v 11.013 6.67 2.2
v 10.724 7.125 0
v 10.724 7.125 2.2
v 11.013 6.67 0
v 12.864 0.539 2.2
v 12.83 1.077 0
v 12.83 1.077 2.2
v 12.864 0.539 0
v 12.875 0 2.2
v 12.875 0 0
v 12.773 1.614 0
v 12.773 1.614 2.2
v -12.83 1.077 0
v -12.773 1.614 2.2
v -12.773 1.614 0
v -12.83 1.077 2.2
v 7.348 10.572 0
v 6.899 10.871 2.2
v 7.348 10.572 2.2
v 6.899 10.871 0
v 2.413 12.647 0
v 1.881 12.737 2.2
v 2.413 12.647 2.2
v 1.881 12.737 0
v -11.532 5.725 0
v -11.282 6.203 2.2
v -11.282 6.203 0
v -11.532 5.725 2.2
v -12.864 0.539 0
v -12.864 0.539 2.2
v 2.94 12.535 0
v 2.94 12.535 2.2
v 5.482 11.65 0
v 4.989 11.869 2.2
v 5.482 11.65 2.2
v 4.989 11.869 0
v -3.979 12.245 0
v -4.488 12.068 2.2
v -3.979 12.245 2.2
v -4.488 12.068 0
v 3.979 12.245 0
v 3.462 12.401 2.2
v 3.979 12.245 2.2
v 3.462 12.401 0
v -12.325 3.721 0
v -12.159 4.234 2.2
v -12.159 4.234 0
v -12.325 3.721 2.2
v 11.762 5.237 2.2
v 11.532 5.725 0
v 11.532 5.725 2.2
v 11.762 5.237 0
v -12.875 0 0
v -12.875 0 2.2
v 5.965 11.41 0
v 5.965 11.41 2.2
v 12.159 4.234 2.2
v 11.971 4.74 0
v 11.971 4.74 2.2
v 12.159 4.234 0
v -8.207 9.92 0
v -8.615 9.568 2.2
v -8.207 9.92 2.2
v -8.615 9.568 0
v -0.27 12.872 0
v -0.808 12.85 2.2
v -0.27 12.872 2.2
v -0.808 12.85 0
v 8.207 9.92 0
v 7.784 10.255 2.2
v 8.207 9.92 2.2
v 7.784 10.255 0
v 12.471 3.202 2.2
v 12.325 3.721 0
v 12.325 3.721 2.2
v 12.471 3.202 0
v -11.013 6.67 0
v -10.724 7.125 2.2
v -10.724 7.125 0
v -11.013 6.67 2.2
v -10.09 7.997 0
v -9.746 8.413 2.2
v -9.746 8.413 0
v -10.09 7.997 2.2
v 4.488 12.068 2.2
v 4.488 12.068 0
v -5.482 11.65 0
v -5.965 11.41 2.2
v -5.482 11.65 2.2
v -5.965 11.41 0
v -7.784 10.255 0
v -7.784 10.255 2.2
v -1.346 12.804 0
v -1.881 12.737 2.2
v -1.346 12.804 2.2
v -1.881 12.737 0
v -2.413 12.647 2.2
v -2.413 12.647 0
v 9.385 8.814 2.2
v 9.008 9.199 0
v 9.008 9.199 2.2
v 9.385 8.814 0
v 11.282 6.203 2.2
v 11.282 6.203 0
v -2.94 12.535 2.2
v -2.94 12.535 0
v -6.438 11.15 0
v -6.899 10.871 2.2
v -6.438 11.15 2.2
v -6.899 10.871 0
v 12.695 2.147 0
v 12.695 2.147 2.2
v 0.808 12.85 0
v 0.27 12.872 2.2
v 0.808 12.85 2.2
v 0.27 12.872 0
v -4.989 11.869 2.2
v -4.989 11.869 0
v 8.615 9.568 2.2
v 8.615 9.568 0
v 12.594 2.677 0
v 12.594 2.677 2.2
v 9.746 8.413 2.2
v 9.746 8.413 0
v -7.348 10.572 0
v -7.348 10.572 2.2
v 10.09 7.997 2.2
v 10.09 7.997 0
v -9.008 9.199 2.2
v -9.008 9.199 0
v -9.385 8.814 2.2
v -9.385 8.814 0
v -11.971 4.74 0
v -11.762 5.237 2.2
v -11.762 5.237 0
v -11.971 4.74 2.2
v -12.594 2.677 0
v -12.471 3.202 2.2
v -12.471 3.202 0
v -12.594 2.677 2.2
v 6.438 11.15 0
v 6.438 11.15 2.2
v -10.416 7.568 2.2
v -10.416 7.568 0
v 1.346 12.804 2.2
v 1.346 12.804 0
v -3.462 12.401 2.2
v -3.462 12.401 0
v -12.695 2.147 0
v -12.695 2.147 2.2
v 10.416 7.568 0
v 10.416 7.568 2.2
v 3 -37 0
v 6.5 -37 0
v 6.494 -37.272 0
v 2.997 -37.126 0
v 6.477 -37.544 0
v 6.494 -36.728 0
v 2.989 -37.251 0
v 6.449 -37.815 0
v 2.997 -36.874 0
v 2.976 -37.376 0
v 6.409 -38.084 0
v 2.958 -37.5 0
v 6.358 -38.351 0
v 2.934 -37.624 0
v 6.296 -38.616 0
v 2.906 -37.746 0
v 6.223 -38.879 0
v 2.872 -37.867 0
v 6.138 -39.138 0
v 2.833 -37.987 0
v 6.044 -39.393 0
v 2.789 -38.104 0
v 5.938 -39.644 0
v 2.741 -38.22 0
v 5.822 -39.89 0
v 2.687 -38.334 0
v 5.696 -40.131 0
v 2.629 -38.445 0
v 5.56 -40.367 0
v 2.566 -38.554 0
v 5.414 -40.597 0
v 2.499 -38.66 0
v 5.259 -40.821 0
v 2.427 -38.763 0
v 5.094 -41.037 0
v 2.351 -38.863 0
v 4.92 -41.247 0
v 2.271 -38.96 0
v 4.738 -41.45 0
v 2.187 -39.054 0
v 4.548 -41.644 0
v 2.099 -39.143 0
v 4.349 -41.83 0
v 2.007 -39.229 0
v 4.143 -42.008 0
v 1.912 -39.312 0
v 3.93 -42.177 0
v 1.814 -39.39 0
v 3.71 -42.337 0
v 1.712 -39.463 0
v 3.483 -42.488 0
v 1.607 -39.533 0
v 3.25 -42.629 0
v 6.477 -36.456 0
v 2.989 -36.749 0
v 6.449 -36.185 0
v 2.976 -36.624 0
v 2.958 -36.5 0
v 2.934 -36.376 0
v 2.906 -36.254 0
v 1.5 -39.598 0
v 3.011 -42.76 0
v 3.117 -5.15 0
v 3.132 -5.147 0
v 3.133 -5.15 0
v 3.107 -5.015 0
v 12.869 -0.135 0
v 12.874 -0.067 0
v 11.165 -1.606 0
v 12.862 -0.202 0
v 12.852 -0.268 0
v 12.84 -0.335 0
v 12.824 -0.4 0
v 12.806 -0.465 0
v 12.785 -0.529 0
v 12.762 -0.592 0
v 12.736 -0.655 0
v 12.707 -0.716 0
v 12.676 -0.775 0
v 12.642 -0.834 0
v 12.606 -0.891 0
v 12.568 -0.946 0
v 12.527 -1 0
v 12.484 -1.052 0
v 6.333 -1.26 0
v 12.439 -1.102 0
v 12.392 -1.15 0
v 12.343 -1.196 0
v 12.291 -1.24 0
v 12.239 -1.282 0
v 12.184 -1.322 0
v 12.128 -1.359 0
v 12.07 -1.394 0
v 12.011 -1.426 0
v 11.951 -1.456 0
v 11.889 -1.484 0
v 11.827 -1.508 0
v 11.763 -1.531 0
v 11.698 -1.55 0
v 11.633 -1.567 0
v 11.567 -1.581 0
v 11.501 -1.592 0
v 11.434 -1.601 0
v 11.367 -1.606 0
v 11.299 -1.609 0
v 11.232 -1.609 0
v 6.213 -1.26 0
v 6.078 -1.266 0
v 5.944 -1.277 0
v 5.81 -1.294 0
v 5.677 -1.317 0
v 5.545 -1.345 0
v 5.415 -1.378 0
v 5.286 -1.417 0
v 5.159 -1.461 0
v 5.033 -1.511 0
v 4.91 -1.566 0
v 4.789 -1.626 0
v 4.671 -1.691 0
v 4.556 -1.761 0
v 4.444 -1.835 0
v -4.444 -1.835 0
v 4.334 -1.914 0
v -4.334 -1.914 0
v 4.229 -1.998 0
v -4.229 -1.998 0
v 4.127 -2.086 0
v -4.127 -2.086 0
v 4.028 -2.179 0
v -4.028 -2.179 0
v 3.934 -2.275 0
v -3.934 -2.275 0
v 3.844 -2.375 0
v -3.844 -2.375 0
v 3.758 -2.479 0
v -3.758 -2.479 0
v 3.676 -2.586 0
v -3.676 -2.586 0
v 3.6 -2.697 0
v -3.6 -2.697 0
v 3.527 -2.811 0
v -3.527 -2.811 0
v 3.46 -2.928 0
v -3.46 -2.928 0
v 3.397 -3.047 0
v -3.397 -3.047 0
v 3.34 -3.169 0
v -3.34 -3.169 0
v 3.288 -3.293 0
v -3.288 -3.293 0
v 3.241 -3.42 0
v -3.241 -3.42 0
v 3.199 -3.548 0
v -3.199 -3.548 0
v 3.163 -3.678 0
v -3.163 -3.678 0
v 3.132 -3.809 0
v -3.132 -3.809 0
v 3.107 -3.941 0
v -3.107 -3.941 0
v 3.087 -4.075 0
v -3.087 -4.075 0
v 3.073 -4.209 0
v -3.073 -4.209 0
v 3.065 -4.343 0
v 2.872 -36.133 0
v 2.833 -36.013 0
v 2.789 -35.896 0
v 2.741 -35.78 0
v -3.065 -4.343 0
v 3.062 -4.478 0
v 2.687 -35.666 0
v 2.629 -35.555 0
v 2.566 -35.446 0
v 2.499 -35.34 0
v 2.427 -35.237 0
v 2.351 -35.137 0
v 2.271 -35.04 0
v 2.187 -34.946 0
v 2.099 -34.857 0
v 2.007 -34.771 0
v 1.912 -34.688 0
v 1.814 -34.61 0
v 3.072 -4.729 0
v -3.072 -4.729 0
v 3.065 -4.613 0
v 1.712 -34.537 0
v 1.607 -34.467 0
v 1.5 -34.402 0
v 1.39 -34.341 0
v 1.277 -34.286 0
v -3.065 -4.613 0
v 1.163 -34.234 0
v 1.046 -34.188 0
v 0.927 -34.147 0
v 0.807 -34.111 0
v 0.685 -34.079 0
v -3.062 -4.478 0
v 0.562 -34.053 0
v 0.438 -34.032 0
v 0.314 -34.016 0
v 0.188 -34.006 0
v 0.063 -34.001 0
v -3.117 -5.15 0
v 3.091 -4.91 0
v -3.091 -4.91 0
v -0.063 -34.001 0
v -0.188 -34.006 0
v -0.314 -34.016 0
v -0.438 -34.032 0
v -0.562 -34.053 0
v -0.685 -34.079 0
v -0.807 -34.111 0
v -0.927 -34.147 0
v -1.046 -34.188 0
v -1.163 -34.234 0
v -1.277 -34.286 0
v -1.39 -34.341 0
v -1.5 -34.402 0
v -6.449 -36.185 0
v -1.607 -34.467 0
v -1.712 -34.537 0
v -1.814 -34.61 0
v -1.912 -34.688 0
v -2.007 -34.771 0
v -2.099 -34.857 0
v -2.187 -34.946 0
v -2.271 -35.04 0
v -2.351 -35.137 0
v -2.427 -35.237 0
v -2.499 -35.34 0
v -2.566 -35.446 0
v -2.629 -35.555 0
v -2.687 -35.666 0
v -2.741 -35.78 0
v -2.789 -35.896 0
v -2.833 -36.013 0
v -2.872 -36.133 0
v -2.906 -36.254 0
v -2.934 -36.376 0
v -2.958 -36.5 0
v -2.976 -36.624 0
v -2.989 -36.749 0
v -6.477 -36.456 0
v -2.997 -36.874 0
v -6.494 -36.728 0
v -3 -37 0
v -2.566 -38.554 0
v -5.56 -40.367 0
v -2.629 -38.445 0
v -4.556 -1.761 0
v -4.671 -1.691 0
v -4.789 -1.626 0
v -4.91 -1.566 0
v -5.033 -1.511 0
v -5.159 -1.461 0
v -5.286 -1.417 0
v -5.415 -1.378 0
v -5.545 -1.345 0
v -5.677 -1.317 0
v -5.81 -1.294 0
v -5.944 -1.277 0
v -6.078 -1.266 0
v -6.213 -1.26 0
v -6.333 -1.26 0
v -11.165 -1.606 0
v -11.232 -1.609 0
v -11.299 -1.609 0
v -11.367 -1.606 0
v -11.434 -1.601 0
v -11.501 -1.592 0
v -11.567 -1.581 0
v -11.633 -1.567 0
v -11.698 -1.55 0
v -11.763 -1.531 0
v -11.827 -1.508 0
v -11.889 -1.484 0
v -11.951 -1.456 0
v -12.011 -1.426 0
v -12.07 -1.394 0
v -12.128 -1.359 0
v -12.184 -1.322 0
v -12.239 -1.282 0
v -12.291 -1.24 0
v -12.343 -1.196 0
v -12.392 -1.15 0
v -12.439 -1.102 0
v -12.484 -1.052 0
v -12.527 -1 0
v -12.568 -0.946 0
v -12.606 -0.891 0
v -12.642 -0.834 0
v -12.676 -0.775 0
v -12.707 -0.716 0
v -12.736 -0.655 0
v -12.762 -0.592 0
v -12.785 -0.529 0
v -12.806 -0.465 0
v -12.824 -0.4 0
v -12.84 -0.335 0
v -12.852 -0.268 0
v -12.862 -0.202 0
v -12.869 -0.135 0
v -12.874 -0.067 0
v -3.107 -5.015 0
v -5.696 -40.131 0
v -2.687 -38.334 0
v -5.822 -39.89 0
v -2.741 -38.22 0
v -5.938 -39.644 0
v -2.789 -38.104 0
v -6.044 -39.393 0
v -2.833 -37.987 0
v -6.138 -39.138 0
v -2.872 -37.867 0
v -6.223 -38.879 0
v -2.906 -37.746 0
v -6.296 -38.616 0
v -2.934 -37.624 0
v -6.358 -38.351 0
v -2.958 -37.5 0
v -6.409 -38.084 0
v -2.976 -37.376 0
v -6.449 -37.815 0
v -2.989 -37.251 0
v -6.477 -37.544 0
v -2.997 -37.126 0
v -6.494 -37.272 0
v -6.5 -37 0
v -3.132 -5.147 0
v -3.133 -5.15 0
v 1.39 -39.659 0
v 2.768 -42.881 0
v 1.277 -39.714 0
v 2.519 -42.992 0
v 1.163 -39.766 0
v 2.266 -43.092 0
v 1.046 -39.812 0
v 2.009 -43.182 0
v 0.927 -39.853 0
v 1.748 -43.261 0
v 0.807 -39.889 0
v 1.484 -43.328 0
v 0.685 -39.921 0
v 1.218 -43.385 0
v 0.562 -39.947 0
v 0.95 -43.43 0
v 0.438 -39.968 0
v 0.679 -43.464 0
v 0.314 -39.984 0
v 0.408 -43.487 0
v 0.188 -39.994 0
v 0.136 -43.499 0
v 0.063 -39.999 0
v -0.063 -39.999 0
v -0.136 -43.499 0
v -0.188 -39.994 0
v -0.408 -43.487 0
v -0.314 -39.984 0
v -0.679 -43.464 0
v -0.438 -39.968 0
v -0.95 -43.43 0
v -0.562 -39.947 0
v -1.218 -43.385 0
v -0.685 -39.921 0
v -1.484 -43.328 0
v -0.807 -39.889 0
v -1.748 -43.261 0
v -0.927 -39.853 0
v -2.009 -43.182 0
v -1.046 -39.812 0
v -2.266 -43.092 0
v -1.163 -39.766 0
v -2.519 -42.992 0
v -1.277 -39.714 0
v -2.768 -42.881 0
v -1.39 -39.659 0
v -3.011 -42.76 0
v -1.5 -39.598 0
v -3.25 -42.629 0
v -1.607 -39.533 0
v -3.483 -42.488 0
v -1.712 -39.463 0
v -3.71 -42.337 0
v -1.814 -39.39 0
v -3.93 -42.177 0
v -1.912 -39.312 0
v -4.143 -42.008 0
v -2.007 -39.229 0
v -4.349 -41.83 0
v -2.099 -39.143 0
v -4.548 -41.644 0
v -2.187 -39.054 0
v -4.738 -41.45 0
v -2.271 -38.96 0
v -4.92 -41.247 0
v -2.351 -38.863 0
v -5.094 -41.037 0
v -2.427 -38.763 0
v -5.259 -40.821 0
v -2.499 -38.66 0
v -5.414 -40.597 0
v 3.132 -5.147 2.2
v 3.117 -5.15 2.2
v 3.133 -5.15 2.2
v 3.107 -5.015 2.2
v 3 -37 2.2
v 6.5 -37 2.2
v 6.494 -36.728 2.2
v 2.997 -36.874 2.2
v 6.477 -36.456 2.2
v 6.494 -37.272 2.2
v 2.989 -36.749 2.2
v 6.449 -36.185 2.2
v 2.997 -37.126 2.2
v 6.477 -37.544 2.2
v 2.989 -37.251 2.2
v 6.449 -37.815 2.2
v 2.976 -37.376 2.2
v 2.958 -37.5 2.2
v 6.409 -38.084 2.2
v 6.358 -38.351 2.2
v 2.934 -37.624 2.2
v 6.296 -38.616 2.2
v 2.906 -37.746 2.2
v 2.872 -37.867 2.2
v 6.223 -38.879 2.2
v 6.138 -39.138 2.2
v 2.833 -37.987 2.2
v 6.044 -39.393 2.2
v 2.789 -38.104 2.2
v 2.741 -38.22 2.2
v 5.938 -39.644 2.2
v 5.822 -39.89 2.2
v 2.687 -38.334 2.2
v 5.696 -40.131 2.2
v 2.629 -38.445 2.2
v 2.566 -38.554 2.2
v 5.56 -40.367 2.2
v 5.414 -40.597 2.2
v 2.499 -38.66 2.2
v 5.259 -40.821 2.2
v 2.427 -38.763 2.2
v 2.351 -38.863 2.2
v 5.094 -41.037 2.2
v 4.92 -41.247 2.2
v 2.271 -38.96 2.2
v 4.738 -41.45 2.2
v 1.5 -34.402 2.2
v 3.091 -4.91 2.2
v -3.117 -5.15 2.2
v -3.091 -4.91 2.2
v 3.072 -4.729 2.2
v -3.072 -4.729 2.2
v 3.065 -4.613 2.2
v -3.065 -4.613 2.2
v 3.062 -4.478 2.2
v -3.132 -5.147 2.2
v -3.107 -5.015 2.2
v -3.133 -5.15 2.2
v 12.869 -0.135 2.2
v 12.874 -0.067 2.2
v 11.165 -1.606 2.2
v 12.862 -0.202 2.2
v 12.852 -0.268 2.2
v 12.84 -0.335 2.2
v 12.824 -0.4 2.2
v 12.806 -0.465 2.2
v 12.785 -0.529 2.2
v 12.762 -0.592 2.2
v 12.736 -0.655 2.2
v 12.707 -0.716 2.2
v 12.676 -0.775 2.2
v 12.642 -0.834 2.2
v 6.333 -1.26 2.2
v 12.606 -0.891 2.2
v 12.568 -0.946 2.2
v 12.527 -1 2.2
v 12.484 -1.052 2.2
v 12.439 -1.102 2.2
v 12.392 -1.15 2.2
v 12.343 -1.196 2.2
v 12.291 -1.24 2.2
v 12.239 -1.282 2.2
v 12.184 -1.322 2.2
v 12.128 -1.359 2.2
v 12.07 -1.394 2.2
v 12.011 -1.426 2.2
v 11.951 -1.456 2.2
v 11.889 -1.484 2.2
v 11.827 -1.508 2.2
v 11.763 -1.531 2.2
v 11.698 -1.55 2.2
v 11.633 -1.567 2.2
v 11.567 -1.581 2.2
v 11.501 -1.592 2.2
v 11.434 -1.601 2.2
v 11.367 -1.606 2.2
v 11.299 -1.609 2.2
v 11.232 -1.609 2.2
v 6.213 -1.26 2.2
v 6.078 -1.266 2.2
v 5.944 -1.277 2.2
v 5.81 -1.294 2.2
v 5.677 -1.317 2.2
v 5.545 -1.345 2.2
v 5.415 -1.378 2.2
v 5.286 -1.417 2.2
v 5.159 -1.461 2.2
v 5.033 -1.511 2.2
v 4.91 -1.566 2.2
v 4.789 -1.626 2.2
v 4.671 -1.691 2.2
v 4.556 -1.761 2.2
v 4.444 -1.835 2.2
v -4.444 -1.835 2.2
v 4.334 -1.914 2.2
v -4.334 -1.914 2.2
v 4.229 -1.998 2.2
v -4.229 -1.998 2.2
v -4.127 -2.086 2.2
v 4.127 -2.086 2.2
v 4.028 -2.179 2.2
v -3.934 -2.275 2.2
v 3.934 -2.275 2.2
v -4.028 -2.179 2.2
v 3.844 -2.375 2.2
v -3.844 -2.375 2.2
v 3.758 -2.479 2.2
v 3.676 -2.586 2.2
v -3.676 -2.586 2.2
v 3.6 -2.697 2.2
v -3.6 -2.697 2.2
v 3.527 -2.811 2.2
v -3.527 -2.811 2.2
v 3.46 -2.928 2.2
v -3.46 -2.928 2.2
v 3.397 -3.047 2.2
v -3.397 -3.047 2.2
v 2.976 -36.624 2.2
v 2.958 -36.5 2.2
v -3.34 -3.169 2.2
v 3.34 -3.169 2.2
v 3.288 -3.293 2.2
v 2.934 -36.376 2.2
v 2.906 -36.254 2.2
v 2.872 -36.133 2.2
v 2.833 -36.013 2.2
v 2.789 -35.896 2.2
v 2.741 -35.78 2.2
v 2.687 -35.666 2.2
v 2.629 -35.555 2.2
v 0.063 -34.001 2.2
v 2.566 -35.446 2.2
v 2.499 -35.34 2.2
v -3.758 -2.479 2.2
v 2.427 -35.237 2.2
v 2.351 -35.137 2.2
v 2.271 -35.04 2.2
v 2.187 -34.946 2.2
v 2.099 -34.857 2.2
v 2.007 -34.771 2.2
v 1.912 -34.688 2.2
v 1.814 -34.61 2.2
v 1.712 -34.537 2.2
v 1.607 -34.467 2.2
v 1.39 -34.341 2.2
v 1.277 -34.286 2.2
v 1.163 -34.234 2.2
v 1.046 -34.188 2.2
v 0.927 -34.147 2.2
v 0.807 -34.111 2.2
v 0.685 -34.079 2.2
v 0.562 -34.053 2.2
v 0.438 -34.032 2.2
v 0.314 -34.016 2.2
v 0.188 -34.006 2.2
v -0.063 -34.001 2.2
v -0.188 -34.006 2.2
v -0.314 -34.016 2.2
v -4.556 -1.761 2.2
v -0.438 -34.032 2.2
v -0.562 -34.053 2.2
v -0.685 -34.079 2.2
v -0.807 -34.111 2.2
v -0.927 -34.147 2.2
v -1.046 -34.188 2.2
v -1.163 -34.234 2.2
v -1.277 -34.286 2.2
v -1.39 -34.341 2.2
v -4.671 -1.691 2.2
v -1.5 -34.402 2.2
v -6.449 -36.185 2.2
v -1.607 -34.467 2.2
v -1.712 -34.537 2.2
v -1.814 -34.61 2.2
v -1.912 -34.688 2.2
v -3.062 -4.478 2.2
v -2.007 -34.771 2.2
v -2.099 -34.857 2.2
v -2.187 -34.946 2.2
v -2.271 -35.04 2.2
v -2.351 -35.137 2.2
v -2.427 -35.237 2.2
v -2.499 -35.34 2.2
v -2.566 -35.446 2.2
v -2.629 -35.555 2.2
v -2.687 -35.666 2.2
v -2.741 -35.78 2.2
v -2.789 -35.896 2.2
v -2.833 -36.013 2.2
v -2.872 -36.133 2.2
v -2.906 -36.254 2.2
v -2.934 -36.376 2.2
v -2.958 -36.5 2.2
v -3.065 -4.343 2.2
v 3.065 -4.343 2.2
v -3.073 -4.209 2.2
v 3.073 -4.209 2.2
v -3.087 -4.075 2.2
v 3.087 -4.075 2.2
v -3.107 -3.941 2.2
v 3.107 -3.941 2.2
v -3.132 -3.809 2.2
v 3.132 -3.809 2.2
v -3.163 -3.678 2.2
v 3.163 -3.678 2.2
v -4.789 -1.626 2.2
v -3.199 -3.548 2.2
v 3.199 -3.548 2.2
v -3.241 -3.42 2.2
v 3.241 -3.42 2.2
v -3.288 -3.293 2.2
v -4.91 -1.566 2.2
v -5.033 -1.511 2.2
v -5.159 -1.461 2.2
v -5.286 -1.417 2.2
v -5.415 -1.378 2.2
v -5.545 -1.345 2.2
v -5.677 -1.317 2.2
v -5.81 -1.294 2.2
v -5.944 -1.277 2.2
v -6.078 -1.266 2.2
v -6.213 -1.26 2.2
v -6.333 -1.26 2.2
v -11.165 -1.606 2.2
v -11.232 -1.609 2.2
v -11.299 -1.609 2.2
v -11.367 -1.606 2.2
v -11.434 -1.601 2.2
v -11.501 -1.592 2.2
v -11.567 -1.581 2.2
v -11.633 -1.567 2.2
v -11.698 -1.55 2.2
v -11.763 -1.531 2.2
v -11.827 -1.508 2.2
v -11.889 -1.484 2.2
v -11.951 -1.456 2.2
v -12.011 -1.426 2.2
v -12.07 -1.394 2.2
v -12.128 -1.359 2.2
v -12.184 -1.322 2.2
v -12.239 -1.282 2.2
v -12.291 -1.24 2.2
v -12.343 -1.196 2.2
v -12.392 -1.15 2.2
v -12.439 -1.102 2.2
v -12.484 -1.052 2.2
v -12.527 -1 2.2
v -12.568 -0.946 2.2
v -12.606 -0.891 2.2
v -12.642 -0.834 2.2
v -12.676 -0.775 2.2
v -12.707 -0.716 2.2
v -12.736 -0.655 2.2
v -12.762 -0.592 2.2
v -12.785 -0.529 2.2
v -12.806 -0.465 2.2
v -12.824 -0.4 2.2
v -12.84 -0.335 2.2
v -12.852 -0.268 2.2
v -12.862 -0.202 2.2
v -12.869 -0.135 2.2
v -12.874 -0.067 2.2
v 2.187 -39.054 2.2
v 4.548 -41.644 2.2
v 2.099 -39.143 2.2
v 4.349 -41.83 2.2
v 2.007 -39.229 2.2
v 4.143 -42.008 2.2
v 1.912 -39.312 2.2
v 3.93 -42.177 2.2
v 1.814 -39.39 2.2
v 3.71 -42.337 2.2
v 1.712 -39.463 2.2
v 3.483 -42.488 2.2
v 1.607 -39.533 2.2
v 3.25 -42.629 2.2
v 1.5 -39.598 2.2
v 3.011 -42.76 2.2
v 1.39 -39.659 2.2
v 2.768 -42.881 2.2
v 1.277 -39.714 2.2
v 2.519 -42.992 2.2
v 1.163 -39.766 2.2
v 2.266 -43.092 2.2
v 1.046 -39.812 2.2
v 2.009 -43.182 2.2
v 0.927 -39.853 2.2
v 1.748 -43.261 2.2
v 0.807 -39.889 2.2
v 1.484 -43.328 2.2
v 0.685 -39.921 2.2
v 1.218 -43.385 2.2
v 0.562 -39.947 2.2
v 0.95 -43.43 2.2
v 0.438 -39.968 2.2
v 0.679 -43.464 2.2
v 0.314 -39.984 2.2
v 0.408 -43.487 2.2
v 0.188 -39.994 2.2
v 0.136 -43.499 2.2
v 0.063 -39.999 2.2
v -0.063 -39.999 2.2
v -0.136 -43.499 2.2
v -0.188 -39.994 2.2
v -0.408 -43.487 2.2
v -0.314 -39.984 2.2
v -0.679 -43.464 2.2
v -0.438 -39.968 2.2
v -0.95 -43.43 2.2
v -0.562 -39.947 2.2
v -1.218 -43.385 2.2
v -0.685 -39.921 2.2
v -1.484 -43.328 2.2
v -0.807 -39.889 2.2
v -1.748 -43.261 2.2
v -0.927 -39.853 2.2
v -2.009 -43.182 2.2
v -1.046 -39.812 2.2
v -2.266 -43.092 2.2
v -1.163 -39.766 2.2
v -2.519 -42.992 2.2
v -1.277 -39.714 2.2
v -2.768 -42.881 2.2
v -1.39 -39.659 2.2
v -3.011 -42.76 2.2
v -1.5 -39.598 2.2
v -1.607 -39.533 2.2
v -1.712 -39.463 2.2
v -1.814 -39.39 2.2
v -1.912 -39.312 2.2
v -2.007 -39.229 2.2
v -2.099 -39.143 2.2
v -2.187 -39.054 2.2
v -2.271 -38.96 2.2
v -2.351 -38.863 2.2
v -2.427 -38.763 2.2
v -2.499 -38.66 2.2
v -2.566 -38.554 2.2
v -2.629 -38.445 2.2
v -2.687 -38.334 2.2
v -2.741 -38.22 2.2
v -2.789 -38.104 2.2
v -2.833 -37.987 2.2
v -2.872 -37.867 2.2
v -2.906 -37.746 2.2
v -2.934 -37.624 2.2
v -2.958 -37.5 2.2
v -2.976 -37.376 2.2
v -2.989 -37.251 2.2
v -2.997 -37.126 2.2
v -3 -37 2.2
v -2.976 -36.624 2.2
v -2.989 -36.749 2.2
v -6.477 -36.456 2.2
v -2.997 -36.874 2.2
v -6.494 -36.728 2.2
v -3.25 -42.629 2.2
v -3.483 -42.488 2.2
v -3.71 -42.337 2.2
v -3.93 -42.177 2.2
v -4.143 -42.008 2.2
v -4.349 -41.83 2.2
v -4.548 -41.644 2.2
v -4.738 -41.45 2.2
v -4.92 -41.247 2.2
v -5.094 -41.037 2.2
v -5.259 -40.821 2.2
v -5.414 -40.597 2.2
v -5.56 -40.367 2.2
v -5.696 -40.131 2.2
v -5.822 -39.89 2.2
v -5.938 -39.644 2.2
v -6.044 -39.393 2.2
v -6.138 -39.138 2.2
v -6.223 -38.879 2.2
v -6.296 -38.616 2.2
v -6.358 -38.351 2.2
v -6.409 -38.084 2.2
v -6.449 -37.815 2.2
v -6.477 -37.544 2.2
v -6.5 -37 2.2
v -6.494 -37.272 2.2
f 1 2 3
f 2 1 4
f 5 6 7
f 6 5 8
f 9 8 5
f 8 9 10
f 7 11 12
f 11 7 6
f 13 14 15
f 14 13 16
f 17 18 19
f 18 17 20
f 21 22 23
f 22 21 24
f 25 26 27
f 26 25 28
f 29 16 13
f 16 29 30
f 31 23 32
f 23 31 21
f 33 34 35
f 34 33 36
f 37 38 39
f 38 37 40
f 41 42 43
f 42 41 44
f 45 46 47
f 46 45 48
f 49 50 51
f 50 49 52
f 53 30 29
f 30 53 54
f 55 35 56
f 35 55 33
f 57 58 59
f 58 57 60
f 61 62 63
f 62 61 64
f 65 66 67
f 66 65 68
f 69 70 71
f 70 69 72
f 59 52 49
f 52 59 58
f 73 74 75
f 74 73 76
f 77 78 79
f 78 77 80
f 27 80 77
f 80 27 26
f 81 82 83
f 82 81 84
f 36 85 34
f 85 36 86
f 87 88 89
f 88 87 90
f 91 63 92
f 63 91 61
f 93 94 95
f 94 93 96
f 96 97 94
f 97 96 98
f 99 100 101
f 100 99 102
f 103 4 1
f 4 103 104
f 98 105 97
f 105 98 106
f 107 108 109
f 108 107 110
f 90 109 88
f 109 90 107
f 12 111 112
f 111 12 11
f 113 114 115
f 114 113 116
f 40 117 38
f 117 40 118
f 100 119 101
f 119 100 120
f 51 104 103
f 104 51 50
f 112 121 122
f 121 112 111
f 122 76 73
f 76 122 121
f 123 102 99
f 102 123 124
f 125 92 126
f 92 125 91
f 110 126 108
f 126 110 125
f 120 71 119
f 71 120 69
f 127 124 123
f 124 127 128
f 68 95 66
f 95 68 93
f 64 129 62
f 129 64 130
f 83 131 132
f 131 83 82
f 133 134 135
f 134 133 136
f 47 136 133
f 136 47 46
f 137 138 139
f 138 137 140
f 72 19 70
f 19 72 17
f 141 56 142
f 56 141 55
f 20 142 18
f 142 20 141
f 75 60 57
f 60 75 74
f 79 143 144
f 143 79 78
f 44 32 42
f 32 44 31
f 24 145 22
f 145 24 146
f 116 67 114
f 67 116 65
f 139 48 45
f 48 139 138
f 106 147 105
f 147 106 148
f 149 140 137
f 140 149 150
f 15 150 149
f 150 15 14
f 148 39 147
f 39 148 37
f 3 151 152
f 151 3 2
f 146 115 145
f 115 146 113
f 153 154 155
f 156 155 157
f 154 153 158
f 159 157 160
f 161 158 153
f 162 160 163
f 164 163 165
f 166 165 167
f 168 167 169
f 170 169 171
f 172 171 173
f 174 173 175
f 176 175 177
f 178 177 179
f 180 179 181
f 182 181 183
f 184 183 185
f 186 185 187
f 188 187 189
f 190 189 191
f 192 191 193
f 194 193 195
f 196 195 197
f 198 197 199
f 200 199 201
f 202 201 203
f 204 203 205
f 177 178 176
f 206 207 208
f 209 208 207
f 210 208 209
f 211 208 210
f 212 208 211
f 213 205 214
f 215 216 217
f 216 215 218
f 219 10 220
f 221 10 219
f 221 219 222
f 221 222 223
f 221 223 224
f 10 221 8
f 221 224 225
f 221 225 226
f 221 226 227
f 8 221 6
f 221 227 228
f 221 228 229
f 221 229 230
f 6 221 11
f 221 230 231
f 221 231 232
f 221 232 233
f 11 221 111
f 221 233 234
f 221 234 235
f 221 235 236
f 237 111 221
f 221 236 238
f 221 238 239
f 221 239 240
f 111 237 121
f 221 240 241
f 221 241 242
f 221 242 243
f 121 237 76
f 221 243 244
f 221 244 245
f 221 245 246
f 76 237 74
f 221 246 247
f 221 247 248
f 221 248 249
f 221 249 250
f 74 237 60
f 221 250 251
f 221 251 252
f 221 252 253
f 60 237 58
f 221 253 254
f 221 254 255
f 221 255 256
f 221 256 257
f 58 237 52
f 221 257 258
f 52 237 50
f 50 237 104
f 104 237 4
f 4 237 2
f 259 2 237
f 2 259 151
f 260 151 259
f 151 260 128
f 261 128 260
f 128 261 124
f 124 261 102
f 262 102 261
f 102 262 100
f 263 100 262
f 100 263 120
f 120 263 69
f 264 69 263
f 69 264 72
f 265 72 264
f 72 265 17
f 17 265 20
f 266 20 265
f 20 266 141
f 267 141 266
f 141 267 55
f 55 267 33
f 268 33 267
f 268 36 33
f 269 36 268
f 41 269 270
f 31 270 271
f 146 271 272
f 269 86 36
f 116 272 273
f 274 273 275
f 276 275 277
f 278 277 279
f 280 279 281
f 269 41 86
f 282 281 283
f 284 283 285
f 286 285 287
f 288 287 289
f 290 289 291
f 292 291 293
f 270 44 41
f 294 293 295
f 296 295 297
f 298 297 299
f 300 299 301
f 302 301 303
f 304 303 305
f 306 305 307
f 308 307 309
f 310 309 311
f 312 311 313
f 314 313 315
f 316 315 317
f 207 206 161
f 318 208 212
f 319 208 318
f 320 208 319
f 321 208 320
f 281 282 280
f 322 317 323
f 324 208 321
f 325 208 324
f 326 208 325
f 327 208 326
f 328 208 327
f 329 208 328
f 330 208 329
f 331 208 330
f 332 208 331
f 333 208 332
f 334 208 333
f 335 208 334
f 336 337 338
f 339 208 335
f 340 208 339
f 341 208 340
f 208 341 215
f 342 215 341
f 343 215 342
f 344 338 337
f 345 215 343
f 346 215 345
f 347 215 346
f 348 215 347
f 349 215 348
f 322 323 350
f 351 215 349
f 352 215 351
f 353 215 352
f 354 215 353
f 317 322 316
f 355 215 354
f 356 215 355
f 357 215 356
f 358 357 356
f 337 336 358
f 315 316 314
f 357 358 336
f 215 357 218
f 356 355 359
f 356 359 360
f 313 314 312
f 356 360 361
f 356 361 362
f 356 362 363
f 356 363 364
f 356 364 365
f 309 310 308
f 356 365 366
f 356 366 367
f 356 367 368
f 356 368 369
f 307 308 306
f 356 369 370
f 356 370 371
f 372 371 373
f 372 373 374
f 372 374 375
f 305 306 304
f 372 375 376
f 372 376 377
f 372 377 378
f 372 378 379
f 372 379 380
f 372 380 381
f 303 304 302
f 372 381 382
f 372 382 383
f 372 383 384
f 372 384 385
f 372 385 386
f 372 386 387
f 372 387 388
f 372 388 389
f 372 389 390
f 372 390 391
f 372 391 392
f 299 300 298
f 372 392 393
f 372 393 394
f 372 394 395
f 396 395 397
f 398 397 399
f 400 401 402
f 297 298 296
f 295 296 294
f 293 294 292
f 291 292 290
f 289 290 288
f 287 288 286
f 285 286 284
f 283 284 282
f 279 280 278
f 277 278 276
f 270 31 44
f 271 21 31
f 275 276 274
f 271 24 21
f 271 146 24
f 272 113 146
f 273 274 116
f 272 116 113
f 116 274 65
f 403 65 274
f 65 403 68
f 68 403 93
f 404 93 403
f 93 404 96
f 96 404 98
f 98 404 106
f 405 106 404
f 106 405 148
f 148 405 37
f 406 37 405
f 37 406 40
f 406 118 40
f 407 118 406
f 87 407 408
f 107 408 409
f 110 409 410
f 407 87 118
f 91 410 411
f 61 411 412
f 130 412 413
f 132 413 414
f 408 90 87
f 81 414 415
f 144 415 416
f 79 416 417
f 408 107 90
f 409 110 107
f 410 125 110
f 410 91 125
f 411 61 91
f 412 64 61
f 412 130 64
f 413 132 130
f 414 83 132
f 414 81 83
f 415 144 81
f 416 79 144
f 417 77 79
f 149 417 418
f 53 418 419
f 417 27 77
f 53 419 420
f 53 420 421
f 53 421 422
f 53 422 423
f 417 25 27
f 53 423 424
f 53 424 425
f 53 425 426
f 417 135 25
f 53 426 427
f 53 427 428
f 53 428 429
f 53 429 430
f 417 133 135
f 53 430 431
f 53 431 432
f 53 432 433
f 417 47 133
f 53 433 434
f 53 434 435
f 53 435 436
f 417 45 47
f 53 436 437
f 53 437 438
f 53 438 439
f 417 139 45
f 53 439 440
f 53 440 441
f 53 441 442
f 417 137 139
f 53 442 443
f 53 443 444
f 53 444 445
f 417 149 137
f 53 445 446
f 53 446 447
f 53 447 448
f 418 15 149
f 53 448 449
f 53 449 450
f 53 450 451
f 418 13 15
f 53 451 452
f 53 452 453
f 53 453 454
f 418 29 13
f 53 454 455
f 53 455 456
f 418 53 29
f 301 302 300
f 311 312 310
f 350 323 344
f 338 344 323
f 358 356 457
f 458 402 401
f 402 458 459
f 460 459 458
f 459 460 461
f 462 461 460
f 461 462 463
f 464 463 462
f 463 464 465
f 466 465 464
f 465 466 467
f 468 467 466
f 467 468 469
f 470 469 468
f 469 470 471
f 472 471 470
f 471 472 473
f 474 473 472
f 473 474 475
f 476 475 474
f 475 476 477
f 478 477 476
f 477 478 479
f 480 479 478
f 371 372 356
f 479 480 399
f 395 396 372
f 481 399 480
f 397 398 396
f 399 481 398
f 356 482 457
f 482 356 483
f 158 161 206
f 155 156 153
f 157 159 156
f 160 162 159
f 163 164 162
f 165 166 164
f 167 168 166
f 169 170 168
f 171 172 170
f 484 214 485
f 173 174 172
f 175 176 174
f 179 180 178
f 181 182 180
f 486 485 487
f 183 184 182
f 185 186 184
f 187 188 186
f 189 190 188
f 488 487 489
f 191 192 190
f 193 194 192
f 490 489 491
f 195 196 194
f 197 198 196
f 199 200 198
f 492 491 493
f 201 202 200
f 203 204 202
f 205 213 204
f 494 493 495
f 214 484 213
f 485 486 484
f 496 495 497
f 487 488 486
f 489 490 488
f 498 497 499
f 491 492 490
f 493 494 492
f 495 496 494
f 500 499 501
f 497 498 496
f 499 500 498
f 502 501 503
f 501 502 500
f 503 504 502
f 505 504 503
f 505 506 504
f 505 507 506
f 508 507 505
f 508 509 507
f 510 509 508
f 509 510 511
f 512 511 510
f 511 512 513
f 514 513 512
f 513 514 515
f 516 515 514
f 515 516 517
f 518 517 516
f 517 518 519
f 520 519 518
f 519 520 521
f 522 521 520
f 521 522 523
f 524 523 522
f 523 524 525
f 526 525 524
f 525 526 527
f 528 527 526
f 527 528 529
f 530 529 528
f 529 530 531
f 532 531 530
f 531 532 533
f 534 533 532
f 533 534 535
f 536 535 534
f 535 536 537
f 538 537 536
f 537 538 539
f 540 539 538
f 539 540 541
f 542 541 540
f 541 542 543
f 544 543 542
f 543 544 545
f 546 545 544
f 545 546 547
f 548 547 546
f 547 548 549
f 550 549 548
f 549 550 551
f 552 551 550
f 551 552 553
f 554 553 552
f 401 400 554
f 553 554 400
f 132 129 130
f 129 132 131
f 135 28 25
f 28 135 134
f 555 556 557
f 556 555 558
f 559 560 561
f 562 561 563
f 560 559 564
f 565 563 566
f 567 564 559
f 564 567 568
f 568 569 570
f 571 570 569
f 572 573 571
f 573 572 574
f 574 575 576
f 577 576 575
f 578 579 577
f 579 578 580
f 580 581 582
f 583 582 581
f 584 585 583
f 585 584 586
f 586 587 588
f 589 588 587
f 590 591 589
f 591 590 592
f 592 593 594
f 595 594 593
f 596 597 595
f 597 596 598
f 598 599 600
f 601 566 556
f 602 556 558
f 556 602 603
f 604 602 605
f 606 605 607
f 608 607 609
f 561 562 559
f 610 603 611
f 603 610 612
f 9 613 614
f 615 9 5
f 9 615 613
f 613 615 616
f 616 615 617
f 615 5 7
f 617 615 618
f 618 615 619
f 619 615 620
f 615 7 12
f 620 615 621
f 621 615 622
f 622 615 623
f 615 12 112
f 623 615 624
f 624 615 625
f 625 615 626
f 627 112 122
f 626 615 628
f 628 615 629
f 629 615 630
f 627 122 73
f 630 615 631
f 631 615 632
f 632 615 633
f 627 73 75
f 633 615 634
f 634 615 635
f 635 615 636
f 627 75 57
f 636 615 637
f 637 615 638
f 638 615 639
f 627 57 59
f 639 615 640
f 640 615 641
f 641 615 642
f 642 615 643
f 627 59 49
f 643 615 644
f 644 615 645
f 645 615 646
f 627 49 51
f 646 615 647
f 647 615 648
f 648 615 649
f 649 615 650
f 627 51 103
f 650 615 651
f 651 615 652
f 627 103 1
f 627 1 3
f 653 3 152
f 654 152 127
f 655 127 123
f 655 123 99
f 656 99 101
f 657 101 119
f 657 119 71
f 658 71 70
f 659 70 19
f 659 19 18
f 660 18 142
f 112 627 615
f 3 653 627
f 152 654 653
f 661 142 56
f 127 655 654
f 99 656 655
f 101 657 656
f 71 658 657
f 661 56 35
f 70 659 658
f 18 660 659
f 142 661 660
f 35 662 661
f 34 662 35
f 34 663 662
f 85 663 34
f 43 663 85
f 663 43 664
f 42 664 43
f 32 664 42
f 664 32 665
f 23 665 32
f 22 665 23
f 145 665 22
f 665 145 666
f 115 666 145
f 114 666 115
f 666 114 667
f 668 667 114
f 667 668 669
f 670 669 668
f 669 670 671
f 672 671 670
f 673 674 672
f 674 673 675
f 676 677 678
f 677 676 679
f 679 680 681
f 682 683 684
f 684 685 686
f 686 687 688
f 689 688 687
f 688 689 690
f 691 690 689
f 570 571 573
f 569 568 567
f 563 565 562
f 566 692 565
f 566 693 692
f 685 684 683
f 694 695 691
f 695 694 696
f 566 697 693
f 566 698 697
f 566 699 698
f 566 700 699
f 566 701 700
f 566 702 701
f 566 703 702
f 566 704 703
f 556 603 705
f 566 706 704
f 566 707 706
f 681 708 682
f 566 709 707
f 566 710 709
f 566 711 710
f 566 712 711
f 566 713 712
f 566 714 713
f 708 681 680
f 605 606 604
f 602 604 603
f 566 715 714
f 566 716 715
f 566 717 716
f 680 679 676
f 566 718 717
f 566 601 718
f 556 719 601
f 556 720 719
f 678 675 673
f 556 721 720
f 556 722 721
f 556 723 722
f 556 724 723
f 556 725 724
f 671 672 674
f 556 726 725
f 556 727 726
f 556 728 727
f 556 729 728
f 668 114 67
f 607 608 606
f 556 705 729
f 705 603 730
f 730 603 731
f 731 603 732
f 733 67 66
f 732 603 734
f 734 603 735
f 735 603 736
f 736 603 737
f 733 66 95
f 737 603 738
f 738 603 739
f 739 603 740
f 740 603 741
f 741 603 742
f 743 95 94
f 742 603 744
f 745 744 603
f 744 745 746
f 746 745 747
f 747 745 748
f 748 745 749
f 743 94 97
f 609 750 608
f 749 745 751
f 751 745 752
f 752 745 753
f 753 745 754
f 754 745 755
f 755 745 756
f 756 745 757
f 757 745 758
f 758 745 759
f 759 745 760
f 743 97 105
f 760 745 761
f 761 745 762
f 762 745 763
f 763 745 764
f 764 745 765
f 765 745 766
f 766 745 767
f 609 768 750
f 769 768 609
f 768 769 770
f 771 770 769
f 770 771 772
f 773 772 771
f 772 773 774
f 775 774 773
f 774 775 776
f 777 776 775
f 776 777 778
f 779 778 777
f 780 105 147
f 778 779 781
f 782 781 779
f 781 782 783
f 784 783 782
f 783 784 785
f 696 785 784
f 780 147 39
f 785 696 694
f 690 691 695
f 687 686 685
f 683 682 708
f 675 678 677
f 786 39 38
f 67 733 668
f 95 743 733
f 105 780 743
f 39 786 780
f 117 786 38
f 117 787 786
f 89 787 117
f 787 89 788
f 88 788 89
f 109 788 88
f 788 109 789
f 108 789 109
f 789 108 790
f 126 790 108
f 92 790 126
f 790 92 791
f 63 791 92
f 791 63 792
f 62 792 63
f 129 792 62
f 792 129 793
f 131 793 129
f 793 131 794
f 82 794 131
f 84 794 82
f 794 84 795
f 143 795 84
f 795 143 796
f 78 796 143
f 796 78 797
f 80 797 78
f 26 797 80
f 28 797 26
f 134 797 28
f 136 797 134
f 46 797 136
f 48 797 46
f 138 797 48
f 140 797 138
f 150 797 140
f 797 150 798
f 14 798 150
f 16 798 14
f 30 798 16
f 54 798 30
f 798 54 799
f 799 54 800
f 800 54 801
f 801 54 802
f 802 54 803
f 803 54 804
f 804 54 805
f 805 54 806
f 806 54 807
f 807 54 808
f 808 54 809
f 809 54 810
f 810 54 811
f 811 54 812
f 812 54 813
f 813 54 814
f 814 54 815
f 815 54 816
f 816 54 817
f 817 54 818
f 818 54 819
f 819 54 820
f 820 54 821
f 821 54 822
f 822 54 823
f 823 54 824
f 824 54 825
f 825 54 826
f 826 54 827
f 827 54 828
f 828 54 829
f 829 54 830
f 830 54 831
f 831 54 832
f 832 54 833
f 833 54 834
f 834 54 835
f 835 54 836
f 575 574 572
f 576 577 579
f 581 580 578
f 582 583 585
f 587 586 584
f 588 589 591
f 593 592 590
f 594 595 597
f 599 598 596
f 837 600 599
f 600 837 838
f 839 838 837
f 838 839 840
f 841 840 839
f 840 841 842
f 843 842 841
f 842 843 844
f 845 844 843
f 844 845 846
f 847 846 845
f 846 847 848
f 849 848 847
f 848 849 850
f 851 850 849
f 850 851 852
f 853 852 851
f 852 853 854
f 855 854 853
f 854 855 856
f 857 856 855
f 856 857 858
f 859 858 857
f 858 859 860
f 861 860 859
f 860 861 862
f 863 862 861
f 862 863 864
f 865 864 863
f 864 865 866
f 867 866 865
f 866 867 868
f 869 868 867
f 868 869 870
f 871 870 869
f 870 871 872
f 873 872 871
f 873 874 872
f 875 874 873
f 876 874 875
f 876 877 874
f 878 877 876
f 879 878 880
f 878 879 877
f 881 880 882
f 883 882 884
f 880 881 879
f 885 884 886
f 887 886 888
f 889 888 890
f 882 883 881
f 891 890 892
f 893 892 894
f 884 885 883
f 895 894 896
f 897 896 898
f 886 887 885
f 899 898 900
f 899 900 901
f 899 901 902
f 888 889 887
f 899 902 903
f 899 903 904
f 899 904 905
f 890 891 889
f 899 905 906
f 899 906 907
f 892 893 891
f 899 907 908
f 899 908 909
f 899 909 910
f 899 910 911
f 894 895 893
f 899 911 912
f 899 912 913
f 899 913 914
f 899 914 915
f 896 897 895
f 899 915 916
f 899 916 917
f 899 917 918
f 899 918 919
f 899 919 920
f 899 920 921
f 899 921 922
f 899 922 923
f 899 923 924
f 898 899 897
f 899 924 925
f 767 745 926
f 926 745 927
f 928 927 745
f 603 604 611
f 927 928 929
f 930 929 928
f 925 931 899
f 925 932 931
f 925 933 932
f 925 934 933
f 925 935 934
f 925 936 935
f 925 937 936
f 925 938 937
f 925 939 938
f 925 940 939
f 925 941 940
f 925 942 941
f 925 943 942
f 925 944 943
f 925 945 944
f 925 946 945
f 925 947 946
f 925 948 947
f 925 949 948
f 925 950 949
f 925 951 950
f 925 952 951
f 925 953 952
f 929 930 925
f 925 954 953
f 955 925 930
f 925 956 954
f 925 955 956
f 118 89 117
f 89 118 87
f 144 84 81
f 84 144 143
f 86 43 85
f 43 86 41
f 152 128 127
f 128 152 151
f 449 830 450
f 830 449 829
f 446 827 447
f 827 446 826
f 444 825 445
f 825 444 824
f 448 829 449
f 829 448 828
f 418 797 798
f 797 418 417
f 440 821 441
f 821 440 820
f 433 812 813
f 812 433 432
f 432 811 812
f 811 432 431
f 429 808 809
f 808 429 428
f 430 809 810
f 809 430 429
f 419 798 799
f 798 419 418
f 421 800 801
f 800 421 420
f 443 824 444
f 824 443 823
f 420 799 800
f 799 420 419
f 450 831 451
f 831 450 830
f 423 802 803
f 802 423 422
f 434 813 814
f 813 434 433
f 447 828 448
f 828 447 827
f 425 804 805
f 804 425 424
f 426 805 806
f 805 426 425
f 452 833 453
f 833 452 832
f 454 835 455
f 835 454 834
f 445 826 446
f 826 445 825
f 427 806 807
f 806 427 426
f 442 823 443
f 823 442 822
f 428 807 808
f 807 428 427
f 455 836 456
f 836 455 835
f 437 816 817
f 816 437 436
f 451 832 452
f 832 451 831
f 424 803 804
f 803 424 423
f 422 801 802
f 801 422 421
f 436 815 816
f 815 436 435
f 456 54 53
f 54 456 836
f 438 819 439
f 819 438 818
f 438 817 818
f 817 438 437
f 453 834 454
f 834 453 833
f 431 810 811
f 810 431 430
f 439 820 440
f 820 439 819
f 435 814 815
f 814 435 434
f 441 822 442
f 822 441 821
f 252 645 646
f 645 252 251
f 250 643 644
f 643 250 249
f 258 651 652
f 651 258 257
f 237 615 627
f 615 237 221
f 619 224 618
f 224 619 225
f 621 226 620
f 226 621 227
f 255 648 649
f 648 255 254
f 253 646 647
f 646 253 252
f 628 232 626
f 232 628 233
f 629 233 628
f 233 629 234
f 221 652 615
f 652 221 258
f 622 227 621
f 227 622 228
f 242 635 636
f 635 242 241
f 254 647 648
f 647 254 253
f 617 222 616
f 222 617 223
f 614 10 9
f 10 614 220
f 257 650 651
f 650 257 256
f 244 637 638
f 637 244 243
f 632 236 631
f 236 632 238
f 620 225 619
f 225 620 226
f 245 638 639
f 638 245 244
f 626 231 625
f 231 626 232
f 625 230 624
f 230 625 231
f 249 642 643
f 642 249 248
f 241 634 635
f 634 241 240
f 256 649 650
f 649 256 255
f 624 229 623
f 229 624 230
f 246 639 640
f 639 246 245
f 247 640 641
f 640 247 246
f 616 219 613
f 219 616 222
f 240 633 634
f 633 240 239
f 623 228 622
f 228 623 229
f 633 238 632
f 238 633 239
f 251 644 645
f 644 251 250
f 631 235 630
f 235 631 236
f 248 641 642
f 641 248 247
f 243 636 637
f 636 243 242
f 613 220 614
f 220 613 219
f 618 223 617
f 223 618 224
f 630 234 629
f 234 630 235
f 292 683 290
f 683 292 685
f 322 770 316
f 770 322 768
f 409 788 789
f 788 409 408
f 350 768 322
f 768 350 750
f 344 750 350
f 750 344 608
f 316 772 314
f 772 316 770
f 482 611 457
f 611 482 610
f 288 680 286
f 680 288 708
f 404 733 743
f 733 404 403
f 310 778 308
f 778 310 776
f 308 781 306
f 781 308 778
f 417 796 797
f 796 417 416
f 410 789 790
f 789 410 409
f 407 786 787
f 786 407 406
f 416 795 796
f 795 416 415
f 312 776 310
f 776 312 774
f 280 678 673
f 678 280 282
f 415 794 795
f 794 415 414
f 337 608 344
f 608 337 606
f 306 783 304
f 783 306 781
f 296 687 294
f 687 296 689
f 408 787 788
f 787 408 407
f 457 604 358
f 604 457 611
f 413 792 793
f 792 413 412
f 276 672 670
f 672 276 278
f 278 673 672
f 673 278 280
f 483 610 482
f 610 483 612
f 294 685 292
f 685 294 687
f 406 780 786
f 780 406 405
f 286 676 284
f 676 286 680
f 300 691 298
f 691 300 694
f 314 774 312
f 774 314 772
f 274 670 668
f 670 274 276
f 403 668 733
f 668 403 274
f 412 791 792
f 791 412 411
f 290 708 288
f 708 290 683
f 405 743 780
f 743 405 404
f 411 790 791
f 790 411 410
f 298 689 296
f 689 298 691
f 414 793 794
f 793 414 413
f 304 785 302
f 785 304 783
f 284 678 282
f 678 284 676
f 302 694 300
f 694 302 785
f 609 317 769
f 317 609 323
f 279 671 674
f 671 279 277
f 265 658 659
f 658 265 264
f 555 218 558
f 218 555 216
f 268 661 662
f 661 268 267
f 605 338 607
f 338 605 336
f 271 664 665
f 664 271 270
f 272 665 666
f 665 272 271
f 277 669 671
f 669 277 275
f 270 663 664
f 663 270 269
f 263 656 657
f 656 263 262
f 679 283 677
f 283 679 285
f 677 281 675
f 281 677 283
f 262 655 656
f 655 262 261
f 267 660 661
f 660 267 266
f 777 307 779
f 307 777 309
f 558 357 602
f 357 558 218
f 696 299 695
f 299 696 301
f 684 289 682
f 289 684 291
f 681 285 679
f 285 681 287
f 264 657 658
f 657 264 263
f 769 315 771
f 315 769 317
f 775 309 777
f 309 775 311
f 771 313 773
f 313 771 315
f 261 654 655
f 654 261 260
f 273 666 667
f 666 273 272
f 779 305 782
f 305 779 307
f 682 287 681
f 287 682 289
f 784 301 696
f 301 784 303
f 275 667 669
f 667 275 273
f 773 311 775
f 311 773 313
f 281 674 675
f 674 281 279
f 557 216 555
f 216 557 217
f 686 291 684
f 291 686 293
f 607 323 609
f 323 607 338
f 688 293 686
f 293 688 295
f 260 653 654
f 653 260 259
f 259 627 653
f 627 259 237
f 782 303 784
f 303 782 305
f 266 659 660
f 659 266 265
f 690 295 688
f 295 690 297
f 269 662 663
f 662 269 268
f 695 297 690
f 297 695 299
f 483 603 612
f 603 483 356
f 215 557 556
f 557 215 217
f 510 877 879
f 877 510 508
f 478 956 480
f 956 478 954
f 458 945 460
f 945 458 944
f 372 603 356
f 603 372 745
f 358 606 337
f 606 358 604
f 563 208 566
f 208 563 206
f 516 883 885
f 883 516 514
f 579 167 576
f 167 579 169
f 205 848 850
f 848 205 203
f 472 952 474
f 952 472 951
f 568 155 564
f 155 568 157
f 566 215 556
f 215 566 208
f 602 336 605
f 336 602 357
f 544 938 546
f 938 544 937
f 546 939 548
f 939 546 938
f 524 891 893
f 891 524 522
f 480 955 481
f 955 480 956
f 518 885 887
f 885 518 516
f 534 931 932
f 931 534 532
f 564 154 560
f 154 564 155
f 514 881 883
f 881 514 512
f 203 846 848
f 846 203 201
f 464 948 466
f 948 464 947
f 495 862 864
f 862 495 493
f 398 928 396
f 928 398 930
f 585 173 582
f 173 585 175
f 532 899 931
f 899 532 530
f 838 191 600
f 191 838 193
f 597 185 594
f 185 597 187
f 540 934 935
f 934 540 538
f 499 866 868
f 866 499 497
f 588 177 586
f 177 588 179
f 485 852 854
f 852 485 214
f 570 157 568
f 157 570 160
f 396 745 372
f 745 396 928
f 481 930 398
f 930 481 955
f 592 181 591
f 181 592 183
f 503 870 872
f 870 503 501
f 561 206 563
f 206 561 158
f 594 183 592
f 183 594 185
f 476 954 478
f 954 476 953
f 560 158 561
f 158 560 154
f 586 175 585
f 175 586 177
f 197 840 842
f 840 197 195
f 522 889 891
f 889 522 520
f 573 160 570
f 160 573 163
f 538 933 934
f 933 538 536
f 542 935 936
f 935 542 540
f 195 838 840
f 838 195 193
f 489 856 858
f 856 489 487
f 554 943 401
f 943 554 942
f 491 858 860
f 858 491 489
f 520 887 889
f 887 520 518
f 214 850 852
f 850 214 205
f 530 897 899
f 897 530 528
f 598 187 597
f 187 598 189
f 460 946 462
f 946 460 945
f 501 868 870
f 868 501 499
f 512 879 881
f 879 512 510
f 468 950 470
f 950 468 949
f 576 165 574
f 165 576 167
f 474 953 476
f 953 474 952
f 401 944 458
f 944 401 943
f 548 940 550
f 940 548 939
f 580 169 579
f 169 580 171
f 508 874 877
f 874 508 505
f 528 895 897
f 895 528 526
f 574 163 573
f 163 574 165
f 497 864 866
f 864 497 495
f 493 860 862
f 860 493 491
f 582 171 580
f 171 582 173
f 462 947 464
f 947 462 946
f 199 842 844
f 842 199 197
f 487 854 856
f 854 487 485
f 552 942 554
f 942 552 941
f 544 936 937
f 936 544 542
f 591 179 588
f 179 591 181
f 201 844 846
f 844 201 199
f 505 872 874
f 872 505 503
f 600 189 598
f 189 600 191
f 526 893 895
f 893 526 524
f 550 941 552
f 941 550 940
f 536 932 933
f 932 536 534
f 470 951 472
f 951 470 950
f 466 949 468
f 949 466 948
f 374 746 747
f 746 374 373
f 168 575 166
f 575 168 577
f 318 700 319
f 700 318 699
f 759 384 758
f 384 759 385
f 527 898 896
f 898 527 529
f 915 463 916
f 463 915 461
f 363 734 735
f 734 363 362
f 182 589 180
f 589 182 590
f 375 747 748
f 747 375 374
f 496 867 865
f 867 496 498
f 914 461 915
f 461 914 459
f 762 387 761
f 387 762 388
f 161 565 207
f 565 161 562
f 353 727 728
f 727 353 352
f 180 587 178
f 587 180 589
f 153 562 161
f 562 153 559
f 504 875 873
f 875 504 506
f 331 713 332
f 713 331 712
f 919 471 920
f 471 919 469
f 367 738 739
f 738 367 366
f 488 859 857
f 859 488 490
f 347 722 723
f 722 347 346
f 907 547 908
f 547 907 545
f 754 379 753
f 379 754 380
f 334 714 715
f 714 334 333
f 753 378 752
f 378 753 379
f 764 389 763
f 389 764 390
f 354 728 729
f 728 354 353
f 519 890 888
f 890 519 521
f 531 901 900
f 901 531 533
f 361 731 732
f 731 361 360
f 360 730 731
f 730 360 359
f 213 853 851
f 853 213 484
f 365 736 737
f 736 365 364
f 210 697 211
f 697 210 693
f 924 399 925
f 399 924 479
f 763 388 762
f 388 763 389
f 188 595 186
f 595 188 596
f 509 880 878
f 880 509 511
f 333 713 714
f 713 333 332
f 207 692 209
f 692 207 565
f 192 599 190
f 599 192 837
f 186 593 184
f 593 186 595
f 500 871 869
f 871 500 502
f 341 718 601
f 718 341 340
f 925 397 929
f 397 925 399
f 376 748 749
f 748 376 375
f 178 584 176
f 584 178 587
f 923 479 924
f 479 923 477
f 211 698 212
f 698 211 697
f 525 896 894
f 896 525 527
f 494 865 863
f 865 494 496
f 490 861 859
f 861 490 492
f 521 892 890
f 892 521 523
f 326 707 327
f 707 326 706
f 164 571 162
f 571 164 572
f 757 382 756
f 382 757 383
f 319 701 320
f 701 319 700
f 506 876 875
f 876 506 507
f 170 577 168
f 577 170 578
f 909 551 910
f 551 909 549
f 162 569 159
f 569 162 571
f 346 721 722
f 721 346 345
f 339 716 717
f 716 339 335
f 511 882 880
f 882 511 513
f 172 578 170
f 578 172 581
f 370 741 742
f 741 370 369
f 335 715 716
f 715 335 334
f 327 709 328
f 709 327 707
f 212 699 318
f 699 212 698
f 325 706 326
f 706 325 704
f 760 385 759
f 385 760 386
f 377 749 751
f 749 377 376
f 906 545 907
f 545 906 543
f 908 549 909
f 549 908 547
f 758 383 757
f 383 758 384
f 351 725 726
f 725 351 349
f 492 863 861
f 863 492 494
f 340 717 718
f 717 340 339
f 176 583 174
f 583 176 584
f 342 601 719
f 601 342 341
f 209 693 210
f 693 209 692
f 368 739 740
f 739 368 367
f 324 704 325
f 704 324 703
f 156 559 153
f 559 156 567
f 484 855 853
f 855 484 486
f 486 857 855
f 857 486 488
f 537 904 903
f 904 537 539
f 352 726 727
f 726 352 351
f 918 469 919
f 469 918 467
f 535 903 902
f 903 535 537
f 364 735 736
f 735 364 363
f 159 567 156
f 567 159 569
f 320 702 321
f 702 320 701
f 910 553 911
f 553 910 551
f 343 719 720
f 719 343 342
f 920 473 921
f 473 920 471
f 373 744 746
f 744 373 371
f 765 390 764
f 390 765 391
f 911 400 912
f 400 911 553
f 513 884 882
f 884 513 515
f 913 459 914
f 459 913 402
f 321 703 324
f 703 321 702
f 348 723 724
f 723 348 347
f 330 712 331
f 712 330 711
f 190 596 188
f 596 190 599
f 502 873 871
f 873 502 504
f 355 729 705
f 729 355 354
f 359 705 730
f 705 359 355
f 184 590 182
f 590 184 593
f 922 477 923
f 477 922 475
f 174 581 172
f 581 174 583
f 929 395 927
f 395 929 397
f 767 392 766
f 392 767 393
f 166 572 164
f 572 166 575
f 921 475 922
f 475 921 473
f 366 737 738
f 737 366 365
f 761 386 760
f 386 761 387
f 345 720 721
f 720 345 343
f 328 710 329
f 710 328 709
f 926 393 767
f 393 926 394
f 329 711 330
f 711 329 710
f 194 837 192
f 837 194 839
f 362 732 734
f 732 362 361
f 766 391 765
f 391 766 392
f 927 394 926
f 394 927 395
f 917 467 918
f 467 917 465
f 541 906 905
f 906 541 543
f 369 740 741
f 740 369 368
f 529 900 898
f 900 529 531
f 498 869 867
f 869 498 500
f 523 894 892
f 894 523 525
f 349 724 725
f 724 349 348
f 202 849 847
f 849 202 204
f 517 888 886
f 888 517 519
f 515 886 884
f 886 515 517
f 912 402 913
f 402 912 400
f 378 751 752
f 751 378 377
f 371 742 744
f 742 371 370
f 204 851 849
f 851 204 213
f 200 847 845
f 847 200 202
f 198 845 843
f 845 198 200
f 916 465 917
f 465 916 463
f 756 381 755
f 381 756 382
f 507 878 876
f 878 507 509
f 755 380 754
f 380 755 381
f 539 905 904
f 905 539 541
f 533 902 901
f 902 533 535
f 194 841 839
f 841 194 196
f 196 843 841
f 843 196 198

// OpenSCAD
d_coin = 25.75; // coin diameter, 22.5 for pound, 23.25 for 1 euro, 25.75 for 2 euros
t_coin = 2.2; // coin thickness, 3.15 for pound, 2.33 for 1 euro, 2.20 for 2 euros
d_hole = 7; // hole diameter
l_tail = 37; // distance from coin center to hole center
$fn = 150; // render quality

coinToken();

// functions
module coinToken()
{
  union(){
    difference()
    {
        // coin
        cylinder(h=t_coin, d=d_coin);

        // cutout
        translate([-(d_coin+1)/2,-d_coin,-0.5]) cube([d_coin+1,d_coin,t_coin+1]);
    }
    copyMirror() {
      hull() {
          translate([-d_coin*7/16,0,0]) cylinder(d=d_coin/8, h=t_coin);
          cylinder(d=d_coin/16, h=t_coin);
        }
    }
    difference() {
        translate([-d_coin/4,-d_coin/5,0]) cube([d_coin/2, d_coin/4 ,t_coin]);
      copyMirror(){
        translate([-d_coin/4.1,-d_coin/5.75,-0.5]) cylinder(d=d_coin/4, h=t_coin+1);
      }
    }
  }
  difference() {
    hull()
    {
      cylinder(h=t_coin, d=5.1);
      translate([0, -l_tail, 0]) cylinder(h=t_coin, d=13);
    }
    translate([0, -l_tail, -0.5]) cylinder(h=t_coin+1, d=6);
  }    
}

module copyMirror(vec=[1,0,0])
{
    children();
    mirror(vec) children();
}
